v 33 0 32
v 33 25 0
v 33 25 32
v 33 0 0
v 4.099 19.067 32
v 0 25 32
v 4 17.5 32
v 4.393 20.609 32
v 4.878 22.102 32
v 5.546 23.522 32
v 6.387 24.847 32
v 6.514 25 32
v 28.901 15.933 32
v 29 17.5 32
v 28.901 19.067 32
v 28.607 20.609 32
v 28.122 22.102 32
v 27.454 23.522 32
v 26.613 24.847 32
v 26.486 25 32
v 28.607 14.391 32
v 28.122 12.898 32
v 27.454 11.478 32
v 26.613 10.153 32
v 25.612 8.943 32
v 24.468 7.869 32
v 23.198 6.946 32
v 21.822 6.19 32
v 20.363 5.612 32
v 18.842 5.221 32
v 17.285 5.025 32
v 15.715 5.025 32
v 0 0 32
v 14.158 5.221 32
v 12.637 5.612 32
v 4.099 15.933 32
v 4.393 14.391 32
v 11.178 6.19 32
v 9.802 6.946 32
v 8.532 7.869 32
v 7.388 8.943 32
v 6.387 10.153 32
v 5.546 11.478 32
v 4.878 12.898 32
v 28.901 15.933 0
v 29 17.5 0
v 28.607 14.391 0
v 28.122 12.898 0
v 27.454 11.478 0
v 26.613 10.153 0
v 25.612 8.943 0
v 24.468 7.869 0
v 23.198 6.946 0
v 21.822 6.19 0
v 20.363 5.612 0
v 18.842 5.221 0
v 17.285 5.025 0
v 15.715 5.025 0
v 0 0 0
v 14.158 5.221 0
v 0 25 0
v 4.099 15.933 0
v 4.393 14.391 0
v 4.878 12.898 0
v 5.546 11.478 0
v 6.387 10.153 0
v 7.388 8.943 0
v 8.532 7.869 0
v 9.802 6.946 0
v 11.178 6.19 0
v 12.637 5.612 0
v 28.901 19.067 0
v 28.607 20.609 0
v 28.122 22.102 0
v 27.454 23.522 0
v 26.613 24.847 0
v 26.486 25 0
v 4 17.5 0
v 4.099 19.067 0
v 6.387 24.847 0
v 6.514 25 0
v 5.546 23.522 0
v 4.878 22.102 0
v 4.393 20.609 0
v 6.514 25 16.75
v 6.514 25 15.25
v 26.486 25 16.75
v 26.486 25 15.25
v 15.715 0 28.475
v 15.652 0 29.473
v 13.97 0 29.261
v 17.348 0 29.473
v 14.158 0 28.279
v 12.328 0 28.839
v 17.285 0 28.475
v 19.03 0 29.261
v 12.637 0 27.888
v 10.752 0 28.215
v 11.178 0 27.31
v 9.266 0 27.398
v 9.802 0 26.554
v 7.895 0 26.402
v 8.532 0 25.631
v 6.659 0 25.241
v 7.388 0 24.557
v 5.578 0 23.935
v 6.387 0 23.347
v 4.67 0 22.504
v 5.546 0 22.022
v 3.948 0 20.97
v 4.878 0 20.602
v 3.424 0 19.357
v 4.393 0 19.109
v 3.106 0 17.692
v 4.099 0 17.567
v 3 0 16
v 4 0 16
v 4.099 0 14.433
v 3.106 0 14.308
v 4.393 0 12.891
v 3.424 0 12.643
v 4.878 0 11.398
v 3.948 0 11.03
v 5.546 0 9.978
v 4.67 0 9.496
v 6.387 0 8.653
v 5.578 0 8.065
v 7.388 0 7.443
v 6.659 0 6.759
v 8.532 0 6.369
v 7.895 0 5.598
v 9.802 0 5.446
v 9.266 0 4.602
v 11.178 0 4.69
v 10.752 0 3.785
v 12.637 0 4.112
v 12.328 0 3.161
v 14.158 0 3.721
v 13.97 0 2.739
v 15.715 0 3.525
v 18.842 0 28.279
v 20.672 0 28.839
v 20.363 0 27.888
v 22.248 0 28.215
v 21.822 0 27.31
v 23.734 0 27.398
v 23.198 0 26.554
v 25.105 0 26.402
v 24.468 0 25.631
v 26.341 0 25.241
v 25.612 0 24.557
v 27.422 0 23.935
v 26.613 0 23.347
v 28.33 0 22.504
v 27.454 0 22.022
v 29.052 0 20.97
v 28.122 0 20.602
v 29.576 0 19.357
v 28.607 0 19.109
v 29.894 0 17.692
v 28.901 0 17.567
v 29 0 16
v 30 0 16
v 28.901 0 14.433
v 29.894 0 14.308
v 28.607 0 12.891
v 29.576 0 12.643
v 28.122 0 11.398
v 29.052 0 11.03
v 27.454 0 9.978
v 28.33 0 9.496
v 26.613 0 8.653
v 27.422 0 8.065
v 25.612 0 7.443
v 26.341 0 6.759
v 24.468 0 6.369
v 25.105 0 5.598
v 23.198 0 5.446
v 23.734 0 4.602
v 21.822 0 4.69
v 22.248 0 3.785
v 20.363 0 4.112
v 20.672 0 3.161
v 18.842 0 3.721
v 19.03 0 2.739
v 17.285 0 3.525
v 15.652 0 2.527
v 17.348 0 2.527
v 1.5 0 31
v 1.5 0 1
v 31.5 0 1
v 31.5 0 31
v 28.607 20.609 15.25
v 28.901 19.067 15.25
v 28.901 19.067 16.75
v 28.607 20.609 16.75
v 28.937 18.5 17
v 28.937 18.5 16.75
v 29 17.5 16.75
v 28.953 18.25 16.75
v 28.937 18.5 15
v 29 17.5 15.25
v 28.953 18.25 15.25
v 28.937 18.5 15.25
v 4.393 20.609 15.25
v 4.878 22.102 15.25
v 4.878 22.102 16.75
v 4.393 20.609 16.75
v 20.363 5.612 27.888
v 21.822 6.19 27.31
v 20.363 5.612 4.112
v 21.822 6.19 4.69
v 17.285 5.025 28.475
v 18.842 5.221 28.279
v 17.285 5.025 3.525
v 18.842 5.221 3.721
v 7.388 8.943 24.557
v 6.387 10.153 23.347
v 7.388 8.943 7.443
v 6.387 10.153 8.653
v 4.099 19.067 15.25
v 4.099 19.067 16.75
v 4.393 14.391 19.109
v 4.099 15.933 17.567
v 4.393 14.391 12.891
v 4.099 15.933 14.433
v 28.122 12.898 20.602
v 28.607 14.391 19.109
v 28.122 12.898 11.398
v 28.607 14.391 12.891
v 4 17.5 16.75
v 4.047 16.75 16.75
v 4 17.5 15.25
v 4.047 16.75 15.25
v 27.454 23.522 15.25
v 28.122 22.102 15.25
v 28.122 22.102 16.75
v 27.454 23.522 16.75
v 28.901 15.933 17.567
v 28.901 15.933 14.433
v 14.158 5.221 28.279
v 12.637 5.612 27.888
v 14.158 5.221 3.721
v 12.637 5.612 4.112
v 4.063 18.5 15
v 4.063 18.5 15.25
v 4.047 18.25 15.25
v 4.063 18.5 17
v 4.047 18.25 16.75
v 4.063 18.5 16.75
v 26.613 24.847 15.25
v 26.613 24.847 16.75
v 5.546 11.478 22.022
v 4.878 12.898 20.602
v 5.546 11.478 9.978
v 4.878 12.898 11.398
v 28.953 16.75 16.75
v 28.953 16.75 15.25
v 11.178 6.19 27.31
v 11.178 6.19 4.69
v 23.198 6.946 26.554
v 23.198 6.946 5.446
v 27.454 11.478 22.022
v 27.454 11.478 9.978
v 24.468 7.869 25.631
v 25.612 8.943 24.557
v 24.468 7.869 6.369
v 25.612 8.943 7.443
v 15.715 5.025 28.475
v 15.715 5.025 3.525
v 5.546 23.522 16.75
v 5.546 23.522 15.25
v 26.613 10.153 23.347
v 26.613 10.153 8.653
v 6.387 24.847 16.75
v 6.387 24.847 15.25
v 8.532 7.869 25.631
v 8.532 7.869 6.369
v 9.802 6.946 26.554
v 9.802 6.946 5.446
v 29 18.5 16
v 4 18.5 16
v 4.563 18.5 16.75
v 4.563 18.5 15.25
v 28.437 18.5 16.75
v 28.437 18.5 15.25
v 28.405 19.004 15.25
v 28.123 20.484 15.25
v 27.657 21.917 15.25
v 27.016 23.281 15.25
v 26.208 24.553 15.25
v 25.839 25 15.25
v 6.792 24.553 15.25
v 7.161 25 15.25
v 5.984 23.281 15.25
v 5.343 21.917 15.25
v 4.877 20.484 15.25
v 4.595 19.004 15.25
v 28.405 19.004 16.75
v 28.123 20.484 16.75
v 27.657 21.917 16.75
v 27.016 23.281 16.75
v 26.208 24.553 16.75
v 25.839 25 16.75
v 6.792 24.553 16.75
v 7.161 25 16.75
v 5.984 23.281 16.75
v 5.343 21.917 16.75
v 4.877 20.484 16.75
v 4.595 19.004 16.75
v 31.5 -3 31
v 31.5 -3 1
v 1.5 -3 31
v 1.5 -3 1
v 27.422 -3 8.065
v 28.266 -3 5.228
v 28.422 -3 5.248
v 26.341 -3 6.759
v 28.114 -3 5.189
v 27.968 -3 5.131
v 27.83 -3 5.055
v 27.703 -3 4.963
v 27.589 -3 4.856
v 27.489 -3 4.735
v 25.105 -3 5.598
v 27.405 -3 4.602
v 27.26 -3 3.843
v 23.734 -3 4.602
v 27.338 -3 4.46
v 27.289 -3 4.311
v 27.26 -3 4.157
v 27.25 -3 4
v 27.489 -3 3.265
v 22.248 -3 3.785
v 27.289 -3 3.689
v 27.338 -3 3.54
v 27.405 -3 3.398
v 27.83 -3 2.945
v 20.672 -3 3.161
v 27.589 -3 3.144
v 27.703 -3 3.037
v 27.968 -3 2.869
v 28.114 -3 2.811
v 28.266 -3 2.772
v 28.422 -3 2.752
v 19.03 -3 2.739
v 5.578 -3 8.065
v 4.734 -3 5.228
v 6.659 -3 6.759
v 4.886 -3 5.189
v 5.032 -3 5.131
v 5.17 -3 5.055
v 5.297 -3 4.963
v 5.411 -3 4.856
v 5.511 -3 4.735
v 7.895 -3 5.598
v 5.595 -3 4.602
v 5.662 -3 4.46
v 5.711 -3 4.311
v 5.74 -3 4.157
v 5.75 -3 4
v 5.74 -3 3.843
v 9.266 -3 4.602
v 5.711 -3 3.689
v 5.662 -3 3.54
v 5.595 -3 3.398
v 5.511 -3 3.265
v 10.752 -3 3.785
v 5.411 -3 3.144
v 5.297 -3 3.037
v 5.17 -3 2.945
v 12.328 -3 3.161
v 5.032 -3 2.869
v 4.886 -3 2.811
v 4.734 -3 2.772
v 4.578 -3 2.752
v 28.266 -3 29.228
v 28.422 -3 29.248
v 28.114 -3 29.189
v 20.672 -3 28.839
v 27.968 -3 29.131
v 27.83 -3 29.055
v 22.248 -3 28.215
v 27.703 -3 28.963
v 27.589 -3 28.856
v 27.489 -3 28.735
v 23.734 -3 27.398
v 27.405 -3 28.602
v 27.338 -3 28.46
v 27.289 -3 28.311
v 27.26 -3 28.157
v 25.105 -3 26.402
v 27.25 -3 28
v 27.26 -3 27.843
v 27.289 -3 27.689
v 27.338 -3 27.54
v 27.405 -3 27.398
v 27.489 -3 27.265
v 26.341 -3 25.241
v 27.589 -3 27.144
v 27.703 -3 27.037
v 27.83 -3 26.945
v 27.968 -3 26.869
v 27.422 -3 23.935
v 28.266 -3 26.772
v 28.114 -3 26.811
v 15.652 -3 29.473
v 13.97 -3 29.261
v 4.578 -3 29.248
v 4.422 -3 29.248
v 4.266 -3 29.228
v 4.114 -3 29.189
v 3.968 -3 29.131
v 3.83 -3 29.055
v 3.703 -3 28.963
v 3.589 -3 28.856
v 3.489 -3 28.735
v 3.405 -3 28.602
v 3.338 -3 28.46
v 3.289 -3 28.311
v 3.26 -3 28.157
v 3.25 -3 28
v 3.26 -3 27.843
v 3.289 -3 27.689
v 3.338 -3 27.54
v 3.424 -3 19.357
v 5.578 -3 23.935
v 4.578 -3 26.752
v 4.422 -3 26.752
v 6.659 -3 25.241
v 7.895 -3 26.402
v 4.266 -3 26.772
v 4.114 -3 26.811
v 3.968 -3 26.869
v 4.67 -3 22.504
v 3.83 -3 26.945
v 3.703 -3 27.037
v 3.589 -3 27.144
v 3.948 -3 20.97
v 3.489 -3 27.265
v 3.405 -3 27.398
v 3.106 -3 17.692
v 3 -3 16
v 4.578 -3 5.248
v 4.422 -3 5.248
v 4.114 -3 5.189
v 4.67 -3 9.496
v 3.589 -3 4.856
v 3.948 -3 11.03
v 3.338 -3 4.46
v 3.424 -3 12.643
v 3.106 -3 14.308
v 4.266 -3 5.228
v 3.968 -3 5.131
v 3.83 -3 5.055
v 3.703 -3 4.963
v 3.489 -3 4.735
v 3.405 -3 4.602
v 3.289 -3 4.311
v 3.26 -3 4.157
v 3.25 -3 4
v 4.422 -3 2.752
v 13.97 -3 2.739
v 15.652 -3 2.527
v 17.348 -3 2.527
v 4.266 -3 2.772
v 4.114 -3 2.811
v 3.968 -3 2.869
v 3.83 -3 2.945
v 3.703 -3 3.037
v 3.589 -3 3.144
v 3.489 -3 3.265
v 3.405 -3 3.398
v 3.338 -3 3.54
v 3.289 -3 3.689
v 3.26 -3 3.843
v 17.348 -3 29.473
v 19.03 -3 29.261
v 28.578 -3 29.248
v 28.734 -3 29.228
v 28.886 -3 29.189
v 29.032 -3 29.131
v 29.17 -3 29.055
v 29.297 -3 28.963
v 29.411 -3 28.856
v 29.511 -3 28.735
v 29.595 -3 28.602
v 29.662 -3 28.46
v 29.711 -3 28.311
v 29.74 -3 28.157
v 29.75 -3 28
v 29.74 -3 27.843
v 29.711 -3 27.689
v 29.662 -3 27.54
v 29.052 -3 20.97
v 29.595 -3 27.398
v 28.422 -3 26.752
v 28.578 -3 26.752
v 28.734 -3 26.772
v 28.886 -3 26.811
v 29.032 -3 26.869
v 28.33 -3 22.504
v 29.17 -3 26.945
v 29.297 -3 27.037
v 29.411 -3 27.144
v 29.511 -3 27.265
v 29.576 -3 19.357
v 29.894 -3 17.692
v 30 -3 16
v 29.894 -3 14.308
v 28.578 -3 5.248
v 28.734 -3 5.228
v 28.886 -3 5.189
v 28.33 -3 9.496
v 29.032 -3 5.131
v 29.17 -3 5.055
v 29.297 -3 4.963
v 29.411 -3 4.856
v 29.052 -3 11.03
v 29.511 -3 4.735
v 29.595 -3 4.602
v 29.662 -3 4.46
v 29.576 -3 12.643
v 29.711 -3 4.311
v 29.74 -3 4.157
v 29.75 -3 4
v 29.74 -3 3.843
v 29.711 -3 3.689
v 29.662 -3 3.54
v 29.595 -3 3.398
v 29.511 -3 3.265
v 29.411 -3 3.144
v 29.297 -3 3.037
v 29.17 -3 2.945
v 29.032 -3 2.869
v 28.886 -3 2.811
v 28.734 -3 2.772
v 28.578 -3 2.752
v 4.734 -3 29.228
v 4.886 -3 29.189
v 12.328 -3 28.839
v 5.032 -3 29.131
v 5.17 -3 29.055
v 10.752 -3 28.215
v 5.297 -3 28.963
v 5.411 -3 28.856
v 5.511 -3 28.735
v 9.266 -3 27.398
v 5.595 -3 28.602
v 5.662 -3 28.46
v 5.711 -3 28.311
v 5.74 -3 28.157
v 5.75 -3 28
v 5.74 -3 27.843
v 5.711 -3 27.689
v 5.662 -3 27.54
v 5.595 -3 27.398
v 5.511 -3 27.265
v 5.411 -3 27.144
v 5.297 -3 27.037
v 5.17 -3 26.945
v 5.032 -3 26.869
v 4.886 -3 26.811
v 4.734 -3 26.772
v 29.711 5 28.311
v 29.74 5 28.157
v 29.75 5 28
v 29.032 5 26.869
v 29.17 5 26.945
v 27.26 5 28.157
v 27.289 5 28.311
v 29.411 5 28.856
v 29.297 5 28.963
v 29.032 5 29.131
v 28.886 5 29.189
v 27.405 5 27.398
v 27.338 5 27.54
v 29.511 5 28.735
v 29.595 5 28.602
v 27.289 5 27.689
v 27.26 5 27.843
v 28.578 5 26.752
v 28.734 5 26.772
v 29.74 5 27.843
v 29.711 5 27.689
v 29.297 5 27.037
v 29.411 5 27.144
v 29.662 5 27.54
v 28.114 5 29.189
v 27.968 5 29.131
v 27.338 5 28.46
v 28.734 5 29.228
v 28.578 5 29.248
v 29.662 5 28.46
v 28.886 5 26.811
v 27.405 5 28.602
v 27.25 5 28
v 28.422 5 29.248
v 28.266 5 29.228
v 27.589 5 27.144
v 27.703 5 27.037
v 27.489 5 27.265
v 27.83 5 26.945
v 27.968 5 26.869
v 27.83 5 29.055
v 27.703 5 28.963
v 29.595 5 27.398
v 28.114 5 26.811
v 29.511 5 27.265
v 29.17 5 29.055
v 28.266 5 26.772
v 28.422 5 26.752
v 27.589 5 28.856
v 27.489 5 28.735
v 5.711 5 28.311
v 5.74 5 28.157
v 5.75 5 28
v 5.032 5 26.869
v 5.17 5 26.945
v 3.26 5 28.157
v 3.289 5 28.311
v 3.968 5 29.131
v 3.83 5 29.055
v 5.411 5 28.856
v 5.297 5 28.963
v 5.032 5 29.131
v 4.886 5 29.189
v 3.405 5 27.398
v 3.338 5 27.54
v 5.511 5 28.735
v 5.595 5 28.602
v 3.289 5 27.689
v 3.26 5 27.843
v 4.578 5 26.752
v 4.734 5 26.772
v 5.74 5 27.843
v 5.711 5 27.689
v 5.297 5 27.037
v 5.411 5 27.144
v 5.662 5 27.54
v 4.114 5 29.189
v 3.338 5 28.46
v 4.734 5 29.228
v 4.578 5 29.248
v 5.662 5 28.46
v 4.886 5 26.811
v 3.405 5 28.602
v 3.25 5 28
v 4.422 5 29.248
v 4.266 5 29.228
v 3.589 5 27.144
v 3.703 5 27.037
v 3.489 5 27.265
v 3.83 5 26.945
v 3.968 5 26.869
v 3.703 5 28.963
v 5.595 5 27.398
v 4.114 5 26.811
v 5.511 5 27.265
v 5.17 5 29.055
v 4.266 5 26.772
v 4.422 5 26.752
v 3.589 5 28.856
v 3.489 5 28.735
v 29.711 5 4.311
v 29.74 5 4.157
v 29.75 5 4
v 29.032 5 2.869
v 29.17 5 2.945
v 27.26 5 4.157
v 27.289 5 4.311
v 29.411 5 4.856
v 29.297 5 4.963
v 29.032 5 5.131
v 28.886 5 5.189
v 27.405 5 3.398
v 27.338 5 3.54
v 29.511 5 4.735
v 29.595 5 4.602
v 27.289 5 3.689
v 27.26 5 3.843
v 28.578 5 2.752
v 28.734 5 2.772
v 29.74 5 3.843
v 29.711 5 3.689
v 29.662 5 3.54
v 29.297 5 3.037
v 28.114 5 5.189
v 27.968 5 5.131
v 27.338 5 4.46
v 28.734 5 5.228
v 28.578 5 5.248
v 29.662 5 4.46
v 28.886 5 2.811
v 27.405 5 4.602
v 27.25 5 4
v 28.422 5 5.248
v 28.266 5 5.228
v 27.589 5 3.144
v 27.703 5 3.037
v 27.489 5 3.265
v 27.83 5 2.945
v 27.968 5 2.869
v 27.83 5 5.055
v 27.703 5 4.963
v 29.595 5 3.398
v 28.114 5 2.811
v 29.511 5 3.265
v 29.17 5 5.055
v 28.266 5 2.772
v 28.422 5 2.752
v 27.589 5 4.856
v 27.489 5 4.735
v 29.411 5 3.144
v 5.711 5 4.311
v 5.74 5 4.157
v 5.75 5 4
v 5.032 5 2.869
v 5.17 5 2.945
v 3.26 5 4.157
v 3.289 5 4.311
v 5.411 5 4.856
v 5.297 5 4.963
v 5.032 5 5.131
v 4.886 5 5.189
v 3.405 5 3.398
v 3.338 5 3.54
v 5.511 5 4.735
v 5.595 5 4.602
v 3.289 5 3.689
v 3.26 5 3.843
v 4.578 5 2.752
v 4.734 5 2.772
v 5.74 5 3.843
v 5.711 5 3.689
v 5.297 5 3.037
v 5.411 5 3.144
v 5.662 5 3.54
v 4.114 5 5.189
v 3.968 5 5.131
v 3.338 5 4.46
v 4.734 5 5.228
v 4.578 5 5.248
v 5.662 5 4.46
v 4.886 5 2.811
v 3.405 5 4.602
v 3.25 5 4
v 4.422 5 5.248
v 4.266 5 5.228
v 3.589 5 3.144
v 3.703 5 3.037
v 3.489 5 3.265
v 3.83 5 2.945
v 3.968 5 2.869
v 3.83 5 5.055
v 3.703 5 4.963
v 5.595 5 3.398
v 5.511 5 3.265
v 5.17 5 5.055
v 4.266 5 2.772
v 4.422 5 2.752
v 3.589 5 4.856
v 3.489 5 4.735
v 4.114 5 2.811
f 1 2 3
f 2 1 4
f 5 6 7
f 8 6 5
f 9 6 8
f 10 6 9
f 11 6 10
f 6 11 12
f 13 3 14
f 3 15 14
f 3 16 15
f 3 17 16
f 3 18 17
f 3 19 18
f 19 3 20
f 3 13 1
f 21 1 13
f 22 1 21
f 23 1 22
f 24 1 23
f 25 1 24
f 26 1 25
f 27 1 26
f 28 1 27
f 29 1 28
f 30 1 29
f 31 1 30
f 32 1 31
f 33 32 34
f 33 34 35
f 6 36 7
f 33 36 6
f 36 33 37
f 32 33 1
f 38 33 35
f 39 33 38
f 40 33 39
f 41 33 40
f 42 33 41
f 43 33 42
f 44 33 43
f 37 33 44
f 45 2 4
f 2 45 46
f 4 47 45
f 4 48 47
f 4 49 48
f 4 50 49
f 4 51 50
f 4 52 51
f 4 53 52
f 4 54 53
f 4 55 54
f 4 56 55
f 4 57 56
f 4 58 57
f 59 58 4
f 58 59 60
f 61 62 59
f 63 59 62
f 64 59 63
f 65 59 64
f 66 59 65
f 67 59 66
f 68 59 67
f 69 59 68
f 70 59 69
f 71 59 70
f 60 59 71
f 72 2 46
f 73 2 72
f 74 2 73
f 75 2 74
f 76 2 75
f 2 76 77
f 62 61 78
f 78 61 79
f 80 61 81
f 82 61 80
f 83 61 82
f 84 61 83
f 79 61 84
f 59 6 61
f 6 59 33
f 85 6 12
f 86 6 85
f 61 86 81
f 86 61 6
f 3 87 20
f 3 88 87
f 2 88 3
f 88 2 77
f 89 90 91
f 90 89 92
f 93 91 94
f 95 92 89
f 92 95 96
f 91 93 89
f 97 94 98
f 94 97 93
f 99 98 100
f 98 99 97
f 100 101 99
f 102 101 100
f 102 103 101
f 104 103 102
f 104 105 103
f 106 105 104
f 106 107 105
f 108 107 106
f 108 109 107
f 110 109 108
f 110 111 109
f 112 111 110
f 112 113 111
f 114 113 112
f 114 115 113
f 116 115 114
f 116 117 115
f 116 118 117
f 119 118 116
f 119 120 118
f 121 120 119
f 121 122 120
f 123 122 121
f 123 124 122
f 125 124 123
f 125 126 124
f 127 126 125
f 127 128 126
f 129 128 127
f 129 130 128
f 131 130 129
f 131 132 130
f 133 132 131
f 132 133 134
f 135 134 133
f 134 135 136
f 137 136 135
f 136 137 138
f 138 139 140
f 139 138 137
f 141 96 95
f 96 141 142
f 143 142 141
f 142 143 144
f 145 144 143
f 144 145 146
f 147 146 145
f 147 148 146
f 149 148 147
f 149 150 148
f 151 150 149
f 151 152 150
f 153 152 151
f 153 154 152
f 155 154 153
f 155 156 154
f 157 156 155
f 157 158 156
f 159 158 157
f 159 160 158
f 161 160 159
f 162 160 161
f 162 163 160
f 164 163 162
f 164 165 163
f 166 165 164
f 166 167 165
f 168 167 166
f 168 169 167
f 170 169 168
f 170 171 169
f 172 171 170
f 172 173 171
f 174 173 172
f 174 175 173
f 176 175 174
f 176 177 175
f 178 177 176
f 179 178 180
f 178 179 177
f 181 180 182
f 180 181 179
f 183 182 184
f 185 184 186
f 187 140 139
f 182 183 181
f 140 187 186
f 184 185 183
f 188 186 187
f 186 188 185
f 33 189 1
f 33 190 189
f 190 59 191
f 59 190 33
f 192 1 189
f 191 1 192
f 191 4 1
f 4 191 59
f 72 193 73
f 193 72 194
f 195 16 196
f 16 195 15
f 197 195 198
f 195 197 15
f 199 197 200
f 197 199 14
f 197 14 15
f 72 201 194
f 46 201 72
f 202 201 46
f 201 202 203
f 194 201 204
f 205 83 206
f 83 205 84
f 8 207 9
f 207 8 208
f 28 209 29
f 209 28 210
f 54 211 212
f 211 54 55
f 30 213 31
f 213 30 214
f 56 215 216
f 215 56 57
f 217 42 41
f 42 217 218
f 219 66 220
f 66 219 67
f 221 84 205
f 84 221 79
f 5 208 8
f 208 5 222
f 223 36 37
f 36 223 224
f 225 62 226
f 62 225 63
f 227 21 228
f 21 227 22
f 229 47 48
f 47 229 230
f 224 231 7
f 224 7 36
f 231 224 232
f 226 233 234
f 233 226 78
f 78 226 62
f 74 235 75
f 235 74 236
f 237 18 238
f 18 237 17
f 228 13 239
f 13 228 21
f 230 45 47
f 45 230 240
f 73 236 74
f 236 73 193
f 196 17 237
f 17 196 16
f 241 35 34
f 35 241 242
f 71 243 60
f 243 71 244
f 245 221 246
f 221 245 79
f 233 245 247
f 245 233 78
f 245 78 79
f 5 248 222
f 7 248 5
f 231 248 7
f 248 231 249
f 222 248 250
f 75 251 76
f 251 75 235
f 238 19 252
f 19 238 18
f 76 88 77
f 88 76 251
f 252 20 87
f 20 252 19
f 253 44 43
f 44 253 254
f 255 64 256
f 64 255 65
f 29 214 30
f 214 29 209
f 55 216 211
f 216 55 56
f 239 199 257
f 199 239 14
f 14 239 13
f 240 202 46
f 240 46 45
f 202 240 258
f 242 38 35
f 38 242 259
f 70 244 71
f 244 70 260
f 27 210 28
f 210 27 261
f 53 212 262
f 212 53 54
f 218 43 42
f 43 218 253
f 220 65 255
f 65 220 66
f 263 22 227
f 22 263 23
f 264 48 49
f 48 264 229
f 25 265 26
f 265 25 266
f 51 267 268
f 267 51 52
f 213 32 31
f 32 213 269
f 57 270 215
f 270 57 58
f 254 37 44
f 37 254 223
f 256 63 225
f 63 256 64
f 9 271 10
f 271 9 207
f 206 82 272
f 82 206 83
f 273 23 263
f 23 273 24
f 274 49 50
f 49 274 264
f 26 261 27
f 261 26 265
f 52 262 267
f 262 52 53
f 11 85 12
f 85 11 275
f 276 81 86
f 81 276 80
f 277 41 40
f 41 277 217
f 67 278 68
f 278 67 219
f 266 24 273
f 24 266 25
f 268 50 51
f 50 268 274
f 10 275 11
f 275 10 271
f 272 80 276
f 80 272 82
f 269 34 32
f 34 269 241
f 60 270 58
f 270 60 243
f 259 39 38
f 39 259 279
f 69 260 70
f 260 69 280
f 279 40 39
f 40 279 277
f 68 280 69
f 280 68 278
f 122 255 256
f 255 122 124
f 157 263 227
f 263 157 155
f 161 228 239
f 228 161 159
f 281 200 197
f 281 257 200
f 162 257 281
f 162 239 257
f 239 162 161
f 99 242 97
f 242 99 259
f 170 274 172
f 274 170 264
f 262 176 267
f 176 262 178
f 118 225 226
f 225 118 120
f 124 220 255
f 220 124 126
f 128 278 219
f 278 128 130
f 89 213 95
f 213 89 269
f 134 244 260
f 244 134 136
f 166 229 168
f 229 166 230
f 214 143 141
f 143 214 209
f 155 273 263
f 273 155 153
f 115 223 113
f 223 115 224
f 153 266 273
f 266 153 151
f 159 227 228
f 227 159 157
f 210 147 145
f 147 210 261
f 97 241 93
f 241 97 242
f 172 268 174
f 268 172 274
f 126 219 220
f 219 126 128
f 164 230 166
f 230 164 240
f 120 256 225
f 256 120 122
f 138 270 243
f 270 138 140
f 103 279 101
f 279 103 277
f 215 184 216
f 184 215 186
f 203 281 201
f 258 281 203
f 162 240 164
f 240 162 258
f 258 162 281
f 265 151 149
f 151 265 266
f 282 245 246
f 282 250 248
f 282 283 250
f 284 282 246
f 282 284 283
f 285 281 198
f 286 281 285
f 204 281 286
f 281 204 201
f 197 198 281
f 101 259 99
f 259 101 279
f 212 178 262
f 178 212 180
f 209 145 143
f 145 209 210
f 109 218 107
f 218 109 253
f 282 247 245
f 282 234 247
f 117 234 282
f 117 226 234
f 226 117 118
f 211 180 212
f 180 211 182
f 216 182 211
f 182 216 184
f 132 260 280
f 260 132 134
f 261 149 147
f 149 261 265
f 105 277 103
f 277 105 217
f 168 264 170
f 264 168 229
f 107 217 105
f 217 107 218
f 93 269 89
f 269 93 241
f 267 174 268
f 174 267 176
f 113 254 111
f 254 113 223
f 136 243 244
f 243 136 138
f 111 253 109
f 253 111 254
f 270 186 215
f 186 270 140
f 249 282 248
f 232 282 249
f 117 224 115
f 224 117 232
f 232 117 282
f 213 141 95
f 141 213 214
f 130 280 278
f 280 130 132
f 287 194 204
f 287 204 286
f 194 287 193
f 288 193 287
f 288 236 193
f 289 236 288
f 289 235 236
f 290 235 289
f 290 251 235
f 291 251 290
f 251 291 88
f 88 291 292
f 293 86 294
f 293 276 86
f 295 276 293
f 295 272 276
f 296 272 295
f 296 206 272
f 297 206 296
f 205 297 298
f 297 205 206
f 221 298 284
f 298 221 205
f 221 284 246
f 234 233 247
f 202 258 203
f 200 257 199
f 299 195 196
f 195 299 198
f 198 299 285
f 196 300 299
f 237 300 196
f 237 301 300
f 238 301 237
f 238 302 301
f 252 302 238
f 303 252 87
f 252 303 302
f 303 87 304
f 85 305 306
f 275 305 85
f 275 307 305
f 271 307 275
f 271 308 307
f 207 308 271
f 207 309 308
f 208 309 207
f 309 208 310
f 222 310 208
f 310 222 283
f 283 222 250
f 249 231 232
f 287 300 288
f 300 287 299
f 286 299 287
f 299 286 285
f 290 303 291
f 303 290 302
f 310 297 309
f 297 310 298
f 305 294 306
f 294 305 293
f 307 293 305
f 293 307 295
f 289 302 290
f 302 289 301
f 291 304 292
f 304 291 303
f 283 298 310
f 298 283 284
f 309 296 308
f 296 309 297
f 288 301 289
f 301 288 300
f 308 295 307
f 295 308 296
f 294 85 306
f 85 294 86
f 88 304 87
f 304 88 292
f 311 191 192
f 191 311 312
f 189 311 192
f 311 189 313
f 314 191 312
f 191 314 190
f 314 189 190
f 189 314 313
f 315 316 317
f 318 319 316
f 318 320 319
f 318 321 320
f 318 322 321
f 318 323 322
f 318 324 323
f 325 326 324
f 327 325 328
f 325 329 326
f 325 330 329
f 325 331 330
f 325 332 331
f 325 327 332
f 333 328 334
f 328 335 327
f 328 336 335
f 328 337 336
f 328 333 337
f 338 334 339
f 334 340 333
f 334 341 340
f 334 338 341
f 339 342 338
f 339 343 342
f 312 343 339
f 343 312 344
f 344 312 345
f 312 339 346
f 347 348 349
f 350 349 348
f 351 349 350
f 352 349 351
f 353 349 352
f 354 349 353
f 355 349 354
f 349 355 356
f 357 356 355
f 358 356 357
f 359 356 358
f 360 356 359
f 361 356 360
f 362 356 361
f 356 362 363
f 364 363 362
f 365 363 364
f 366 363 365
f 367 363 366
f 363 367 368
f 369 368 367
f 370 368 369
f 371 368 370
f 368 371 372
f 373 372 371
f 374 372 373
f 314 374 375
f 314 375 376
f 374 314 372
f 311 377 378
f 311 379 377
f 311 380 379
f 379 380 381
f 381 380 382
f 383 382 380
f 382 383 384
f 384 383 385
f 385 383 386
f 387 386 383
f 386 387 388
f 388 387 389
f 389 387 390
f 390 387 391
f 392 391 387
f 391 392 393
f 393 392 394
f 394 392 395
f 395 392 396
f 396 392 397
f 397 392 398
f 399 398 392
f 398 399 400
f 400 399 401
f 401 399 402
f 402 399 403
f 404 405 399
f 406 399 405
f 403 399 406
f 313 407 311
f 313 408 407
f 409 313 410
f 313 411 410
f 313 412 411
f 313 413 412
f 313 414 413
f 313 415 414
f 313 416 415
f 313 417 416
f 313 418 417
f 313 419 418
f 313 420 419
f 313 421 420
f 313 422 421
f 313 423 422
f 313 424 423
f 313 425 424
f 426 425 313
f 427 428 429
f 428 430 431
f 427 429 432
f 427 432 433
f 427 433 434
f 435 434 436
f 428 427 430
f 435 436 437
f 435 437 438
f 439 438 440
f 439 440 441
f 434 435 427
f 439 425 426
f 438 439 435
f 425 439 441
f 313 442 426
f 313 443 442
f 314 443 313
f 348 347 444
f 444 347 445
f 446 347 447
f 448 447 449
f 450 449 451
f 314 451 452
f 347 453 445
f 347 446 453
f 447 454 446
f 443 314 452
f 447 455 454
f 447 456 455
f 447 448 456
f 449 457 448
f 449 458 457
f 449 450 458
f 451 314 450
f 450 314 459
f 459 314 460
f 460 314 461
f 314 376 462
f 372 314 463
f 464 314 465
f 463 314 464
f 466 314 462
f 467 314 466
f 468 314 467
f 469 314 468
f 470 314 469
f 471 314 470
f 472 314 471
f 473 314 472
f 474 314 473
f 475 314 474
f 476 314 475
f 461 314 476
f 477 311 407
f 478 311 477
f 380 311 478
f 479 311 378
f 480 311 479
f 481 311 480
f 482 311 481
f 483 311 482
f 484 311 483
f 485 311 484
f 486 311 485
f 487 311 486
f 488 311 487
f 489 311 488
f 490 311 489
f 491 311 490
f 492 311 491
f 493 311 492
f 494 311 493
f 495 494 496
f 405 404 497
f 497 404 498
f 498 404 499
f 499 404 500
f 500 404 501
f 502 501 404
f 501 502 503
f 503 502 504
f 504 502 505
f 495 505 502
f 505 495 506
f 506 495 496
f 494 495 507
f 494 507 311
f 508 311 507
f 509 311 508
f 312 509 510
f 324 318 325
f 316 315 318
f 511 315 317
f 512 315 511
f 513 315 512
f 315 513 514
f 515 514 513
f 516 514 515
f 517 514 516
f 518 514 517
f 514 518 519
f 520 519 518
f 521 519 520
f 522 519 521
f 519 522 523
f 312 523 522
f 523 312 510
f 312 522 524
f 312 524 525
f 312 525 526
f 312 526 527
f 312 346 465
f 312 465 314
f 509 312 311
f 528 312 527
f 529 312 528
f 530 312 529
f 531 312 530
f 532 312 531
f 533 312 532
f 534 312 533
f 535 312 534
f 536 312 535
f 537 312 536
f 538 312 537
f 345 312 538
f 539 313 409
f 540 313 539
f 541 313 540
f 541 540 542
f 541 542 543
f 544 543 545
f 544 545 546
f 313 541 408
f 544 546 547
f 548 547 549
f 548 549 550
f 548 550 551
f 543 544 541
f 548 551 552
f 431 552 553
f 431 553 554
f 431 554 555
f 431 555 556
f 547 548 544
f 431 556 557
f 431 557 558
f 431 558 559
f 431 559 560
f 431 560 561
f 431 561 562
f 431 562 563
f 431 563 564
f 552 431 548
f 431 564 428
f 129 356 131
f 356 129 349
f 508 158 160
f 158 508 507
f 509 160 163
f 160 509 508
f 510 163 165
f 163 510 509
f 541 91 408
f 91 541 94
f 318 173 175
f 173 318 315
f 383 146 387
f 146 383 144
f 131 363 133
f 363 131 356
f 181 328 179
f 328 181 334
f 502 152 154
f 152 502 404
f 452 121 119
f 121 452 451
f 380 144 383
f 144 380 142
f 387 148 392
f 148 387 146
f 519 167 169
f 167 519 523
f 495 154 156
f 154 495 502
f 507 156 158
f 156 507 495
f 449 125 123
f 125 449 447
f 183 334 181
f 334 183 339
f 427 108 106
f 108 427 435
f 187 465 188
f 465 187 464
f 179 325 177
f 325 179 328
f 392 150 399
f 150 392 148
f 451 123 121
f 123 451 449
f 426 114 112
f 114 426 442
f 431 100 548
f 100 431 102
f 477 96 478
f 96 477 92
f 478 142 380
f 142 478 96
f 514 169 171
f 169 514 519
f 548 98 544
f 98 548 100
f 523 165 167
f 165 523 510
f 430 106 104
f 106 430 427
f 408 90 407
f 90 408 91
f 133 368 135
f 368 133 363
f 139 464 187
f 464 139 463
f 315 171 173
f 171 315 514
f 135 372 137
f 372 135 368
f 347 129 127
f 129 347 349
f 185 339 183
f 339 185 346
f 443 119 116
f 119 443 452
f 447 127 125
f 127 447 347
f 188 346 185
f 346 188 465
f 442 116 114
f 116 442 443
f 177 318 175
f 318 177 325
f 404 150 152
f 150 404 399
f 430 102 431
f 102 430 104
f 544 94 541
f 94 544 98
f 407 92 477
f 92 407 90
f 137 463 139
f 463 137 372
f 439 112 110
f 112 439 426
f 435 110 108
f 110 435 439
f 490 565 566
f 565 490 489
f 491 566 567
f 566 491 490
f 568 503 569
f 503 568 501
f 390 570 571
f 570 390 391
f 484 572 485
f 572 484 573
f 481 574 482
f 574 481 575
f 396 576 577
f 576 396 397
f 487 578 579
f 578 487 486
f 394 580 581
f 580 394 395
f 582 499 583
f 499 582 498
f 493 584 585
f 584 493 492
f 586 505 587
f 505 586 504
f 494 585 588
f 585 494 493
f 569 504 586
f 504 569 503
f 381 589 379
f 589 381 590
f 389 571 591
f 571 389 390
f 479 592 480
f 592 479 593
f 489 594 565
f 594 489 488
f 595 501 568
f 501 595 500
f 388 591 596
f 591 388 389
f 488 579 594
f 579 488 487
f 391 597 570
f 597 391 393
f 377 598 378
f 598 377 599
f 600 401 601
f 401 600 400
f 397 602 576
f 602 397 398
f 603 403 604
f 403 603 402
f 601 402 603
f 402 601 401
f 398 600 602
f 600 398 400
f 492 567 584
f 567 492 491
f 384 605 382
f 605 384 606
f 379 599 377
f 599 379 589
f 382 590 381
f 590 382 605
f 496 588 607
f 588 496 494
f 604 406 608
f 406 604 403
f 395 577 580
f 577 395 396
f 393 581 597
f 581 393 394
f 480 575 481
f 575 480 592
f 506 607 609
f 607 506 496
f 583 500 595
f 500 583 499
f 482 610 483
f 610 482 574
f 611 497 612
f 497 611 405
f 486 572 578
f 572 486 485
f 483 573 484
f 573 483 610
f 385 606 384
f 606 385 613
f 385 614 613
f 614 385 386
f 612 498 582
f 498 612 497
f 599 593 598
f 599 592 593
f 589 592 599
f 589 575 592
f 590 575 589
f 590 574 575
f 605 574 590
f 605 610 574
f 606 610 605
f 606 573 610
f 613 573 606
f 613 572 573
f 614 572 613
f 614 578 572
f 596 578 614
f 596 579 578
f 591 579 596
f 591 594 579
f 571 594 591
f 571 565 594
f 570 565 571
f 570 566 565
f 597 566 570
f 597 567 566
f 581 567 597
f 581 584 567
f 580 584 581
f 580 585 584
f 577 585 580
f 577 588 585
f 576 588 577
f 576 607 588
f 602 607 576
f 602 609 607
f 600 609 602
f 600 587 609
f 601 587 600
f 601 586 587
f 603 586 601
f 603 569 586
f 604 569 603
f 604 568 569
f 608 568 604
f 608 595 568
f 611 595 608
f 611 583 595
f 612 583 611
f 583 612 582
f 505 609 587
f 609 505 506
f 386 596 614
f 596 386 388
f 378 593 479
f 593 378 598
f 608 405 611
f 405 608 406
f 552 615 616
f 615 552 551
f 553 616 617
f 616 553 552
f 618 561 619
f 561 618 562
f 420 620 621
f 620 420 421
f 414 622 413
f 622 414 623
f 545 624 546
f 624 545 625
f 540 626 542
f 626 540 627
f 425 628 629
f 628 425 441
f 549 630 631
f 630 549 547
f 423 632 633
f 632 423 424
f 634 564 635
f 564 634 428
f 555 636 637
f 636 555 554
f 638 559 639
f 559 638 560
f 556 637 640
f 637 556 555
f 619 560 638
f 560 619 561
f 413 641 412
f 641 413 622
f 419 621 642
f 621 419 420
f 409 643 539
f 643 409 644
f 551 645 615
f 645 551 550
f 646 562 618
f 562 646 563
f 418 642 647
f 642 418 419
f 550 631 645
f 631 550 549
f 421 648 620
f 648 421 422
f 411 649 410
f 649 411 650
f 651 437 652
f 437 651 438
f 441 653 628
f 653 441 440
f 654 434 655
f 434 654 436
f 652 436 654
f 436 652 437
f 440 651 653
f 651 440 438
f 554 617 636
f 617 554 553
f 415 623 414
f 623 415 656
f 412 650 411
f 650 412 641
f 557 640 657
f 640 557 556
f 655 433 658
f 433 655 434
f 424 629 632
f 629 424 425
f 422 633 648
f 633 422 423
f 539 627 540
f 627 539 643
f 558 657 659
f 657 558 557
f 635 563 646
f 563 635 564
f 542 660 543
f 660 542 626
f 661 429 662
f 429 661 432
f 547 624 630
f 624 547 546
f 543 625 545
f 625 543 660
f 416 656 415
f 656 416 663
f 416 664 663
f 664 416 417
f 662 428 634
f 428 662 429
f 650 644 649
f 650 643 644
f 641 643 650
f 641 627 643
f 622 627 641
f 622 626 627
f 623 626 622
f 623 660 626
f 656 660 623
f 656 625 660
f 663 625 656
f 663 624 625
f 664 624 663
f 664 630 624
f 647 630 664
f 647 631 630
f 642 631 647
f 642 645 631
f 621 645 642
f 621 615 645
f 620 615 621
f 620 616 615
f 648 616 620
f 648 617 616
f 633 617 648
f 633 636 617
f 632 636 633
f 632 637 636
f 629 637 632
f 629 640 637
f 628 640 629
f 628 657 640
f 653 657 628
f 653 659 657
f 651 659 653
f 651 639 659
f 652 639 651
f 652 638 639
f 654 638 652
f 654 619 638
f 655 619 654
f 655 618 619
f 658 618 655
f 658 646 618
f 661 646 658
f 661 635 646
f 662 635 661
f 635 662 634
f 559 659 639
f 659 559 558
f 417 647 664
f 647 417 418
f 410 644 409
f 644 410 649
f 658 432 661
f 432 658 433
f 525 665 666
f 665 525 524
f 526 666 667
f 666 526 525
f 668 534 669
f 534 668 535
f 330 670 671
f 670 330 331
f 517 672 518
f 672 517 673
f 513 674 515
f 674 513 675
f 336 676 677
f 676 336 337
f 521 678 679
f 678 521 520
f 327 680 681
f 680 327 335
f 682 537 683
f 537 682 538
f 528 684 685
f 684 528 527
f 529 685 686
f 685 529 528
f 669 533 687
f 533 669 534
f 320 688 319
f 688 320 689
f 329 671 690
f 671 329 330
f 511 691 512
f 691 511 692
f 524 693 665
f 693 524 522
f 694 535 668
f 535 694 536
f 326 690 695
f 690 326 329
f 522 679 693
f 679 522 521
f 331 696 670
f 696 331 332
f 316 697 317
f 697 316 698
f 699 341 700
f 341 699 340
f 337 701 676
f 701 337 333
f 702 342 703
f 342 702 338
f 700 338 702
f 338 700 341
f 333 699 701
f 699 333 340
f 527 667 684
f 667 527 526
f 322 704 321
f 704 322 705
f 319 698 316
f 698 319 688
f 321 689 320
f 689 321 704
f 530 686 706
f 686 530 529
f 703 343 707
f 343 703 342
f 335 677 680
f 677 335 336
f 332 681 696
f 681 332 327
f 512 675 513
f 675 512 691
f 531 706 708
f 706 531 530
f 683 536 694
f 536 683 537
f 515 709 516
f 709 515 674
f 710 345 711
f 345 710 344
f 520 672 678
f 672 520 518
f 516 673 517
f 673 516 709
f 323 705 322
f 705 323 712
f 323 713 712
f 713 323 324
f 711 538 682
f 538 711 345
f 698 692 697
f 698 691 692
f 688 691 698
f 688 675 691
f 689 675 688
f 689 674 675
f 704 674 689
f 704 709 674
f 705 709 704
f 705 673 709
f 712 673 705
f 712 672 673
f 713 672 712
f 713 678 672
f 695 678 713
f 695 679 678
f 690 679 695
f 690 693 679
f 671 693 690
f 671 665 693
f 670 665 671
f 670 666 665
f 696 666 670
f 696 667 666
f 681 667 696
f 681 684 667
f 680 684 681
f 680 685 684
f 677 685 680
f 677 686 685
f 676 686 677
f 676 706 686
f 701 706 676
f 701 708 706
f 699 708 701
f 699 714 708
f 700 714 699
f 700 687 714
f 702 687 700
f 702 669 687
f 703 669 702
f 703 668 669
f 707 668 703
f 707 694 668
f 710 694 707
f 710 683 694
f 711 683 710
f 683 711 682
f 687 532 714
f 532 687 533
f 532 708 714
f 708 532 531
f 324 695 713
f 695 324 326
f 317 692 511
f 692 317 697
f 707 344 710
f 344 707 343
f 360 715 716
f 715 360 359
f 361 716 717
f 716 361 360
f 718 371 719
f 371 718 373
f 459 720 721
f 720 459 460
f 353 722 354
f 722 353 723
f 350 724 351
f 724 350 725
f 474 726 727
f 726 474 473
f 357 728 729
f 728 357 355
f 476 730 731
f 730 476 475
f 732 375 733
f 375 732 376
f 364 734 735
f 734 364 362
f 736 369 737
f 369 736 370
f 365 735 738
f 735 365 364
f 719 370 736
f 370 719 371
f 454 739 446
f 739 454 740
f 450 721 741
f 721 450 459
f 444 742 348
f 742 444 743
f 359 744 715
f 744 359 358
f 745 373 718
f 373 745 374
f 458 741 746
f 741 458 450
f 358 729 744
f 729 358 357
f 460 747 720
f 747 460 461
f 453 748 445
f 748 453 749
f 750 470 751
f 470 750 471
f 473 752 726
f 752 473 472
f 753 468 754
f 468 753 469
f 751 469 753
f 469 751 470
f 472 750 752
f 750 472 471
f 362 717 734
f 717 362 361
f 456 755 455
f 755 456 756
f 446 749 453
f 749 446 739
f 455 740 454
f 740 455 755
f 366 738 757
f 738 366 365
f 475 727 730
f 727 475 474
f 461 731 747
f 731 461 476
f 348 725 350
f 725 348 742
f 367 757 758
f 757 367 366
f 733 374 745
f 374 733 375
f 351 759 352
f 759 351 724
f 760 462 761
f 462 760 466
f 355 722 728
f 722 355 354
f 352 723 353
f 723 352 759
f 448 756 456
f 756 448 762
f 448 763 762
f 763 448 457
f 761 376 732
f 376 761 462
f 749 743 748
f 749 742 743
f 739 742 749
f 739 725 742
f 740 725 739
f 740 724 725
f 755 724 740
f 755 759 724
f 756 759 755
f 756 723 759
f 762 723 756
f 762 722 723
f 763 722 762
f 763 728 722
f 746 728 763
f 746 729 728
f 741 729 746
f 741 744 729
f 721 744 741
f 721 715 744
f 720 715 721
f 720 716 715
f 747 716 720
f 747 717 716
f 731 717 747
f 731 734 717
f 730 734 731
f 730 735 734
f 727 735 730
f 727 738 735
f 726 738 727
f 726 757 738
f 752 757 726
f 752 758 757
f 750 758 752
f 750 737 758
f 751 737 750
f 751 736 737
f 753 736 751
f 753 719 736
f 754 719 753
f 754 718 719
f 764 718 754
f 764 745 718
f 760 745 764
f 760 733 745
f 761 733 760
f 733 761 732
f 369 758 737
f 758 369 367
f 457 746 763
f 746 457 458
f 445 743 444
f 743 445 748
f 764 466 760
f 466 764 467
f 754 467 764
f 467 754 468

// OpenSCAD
/*
 * Hotend Duct Cooler Generator. 
 * 
 * http://www.thingiverse.com/thing:1740504
 * 
 * By: Maxstupo
 */

// (Preset compatible with Sunhokey Prusa i3 2015)
// Variables preset for E3D v5 hotend (I think)

$fn = 50;


sideThickness = 4;
backThickness = 5;

// The height of the hot end cooling fins (or the height of the mount).
height = 32;

// The diameter of the hot end cooling fins.
hotendFinDiameter = 25;

/*[Fan Mount]*/

// The fan size used (eg. 30x30)
fanSize = 30;

// The inside diameter of the fan.
innerFanDiameter = 27;

// The spacing between the holes. (center to center)
fanMountHoleSize = 24;

// The plate thickness for the fan.
fanPlateThickness = 3;

// The length of the duct.
ductLength = 0;

// The thickness of the duct.
ductThickness = 2;

// The hole diameter for the fan mount holes.
fanPlateMountHoleDiameter = 2.5;

// The depth of the holes for the fan mount.
fanPlateMountHoleDepth = 5;

fanMountLength = fanPlateThickness+ductLength;

/*[Holder Tab]*/
tabHeightOffset = 0;
tabLength = 1;
tabThickness = 1.5;


width = hotendFinDiameter+sideThickness*2;
length = hotendFinDiameter;


module fanHole() {
    
    // Fan hole.
    fanHoleheight = length/2+backThickness;
    
    translate([width/2,fanHoleheight+1,height/2])rotate([90,0,0]) 
    cylinder(h=fanHoleheight+2,d=hotendFinDiameter,d2=hotendFinDiameter);
        
}

difference(){
    union() {
        difference() {
            cube([width,length,height]);
            
            // Slot for clipping onto the hotend.
            translate([width/2,length/2+backThickness,-1]) cylinder(h=height+2,d=hotendFinDiameter);
            
            fanHole();
        }
    
        // Tab to prevent mount sliding off the hotend.
        difference() {
            translate([width/2,length/2+backThickness,height/2-tabThickness/2+tabHeightOffset]) 
            cylinder(h=tabThickness, d=hotendFinDiameter);
            
            translate([width/2,length/2+backThickness,height/2-tabThickness/2+tabHeightOffset-1]) 
            cylinder(h=tabThickness+2,d=hotendFinDiameter-tabLength);
           
            fanHole(); 
            translate([0,length,0]) cube([width,backThickness,height]);
        }
        
        
        // Duct & Plate
        translate([width/2-fanSize/2,0,height/2-fanSize/2]) {
         
                // Plate
                difference() {
                    translate([0,-fanMountLength,0]) cube([fanSize,fanPlateThickness,fanSize]);
                    translate([fanSize/2,fanPlateThickness+0.5-fanMountLength,fanSize/2]) rotate([90,0,0]) cylinder(h=fanPlateThickness+1,d=innerFanDiameter);
                }
        
                // Duct
                difference() {
                    dd1 = hotendFinDiameter;
                    dd2 = innerFanDiameter;
                    
                    translate([fanSize/2,0,fanSize/2])  rotate([90,0,0]) cylinder(h=fanMountLength-fanPlateThickness,d=dd1+ductThickness,d2=dd2+ductThickness);     
                    translate([fanSize/2,0.25,fanSize/2])  rotate([90,0,0]) cylinder(h=fanMountLength-fanPlateThickness+0.5,d=dd1,d2=dd2);
                
                }
            
        }
        
    }
    
    // Fan mount holes.
    translate([width/2-fanSize/2,0,height/2-fanSize/2]) {
            translate([fanSize/2+fanMountHoleSize/2,fanPlateThickness-fanMountLength+fanPlateMountHoleDepth,fanSize/2+fanMountHoleSize/2]) rotate([90,0,0]) cylinder(h=fanPlateThickness+fanPlateMountHoleDepth,d=fanPlateMountHoleDiameter);
            translate([fanSize/2-fanMountHoleSize/2,fanPlateThickness-fanMountLength+fanPlateMountHoleDepth,fanSize/2+fanMountHoleSize/2]) rotate([90,0,0]) cylinder(h=fanPlateThickness+fanPlateMountHoleDepth,d=fanPlateMountHoleDiameter);
                    
            translate([fanSize/2+fanMountHoleSize/2,fanPlateThickness-fanMountLength+fanPlateMountHoleDepth,fanSize/2-fanMountHoleSize/2]) rotate([90,0,0]) cylinder(h=fanPlateThickness+fanPlateMountHoleDepth,d=fanPlateMountHoleDiameter);
            translate([fanSize/2-fanMountHoleSize/2,fanPlateThickness-fanMountLength+fanPlateMountHoleDepth,fanSize/2-fanMountHoleSize/2]) rotate([90,0,0]) cylinder(h=fanPlateThickness+fanPlateMountHoleDepth,d=fanPlateMountHoleDiameter);
    }
}


